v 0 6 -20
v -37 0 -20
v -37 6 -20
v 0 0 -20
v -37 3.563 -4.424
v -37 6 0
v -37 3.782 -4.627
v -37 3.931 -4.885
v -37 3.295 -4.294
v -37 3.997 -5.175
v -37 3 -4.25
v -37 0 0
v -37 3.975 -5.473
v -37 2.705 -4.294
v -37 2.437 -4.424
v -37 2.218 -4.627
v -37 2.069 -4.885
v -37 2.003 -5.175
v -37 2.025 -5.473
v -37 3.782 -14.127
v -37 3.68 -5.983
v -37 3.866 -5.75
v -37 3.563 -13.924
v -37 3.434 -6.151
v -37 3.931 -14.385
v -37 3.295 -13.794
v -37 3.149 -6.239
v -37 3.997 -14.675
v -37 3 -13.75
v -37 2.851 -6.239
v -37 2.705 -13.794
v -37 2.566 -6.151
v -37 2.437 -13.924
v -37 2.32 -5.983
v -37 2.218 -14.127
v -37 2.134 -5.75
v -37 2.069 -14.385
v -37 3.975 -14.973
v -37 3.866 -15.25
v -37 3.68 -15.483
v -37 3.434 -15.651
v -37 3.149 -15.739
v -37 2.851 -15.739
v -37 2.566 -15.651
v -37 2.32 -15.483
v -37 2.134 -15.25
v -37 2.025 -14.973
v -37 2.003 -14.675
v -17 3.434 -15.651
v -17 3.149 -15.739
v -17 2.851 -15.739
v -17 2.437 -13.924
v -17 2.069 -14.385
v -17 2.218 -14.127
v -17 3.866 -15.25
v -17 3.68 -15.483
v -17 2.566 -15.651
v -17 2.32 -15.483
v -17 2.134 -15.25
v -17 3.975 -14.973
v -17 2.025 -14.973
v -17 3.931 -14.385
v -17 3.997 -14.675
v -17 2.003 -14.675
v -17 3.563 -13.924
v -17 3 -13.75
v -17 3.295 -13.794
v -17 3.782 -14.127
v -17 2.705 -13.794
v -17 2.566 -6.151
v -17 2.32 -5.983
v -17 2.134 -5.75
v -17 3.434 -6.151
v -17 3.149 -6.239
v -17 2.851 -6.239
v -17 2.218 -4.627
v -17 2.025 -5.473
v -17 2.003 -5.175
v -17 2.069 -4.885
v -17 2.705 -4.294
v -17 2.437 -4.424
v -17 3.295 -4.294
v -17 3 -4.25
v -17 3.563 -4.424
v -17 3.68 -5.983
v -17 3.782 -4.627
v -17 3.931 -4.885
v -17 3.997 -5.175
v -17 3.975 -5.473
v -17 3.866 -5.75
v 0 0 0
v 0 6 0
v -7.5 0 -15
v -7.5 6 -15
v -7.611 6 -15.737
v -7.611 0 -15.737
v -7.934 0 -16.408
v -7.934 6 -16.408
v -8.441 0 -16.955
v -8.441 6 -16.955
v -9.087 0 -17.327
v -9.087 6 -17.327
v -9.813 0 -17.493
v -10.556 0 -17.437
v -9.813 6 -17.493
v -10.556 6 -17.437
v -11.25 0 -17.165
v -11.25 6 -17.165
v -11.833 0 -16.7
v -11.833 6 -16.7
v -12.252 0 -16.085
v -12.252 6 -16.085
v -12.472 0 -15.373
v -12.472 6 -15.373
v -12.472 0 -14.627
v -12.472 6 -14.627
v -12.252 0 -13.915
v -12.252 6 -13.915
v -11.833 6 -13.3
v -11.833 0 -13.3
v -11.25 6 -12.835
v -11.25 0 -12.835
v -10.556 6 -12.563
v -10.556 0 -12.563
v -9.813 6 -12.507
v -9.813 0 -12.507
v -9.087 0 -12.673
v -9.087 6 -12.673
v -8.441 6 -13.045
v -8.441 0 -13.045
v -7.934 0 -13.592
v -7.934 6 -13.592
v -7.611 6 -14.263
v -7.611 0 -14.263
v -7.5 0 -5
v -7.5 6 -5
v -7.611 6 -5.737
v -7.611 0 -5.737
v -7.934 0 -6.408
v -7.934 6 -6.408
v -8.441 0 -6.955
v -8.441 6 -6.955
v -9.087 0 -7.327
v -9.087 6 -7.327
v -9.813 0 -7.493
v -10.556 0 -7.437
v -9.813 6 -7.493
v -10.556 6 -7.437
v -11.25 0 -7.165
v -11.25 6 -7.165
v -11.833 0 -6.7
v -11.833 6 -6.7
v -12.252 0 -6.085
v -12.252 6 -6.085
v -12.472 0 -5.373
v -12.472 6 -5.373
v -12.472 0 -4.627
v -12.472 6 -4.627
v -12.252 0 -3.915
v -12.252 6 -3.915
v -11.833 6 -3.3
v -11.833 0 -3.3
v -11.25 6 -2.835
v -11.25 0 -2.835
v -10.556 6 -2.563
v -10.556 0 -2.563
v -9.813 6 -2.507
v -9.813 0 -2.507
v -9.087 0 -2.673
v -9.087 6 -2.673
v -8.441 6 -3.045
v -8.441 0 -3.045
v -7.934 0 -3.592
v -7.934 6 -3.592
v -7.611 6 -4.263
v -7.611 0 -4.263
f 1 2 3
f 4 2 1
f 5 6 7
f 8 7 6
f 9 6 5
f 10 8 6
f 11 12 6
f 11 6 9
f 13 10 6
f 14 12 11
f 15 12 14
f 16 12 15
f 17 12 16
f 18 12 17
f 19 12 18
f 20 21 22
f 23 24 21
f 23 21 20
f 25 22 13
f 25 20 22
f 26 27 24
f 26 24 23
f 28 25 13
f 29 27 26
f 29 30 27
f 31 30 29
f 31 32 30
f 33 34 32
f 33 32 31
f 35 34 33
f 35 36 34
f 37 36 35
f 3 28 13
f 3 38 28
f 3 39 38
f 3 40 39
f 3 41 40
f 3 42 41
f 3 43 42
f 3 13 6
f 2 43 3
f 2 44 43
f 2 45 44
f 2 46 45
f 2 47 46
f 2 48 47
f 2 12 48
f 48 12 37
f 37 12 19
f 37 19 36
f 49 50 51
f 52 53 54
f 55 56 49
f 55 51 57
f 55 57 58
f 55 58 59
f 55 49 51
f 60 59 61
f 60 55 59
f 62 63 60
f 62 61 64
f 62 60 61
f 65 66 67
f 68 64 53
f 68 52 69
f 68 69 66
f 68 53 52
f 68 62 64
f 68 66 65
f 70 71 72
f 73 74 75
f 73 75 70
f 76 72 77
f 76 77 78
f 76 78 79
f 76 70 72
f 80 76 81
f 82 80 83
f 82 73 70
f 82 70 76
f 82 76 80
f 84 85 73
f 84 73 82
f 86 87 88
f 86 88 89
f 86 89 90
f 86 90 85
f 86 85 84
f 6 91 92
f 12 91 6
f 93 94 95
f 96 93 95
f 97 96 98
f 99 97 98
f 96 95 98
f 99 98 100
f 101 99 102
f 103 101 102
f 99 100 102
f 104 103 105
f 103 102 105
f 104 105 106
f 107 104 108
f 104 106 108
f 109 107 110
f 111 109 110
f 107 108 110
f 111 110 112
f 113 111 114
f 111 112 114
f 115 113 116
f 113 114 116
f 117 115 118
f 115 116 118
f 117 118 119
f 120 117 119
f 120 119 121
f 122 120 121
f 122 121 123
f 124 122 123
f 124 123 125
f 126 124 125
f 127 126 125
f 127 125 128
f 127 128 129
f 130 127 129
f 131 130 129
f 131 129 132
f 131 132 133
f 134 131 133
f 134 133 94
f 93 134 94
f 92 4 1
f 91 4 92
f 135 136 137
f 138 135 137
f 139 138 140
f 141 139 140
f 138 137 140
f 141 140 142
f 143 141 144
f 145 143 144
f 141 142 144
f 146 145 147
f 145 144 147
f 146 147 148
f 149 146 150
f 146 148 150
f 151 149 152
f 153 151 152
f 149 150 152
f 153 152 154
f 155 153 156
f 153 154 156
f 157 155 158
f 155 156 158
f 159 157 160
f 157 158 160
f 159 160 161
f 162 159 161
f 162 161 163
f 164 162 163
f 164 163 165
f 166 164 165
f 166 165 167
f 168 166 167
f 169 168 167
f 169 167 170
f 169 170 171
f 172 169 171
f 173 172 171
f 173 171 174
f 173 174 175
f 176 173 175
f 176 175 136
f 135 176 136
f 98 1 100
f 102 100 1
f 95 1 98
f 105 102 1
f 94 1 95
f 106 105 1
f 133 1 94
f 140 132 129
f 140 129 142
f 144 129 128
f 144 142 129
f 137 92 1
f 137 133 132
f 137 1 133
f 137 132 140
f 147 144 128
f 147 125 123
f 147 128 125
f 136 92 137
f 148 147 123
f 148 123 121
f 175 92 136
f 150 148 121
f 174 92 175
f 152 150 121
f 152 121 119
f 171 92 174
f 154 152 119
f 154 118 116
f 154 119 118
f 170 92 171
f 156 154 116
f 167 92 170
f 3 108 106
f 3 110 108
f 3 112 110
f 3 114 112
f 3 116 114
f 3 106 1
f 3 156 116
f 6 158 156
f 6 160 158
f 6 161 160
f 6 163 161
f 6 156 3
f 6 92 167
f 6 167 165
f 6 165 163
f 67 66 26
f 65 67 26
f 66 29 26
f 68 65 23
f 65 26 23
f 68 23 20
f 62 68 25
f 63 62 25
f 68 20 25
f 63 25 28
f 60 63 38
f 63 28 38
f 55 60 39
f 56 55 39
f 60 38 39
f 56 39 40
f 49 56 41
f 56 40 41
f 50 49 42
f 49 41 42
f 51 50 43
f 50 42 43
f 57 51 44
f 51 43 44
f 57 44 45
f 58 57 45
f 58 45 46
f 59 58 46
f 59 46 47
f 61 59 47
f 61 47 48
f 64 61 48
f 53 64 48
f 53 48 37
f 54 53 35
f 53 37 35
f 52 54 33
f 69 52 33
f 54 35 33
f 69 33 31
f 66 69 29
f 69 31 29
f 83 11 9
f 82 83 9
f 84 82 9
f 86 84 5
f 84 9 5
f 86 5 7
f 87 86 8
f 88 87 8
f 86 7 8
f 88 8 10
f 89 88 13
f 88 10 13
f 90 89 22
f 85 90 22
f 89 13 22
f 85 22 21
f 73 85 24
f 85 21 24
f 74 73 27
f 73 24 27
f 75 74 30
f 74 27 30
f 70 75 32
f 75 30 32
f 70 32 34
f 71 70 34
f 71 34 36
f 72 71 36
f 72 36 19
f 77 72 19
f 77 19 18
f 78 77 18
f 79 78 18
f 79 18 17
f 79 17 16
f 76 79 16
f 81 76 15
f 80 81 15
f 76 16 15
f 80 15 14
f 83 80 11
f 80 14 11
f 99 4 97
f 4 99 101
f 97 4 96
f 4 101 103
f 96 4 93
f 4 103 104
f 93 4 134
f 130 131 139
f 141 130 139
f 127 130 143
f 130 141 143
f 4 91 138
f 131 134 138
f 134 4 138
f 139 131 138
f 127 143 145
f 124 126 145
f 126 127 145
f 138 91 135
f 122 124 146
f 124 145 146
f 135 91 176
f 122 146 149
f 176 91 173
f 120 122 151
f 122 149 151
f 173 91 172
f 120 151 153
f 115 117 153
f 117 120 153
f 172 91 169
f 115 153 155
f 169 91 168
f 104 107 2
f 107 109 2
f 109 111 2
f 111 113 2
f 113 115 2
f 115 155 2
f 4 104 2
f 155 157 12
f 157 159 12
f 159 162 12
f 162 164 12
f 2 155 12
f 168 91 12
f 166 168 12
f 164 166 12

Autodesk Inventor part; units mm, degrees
ref_plane "YZ Plane" through (0, 0, 0) normal (1, 0, 0) x (0, 1, 0)
ref_plane "XZ Plane" through (0, 0, 0) normal (0, 1, 0) x (-1, 0, 0)
ref_plane "XY Plane" through (0, 0, 0) normal (0, 0, 1) x (1, 0, 0)
sketch "Sketch1" plane through (0, 0, 0) normal (0, 1, 0) x (-1, 0, 0)
  line L0 (0, 0) -> (37, 0)
  line L1 (37, 0) -> (37, -20)
  line L2 (37, -20) -> (0, -20)
  line L3 (0, -20) -> (0, 0)
  dimension "d0" = 37
  dimension "d1" = 20
extrude "Extrusion1" add sketch "Sketch1" along normal blind 6
sketch "Sketch2" plane through (0, 6, 0) normal (0, 1, 0) x (1, 0, 0)
  circle A0 centre (-10, 5) radius 2.5
  circle A1 centre (-10, 15) radius 2.5
  line L0 (0, 0) -> (0, 20) projected
  line L1 (0, 20) -> (-37, 20) projected
  line L2 (-37, 0) -> (0, 0) projected
  dimension "d4" = 5
  dimension "d5" = 5
  dimension "d6" = 10
  dimension "d7" = 10
  dimension "d8" = 5
  dimension "d9" = 5
extrude "Extrusion2" cut sketch "Sketch2" against normal blind 8
sketch "Sketch3" plane through (-37, 0, -20) normal (-1, 0, 0) x (0, 0, 1)
  circle A0 centre (5.25, 3) radius 1
  circle A1 centre (14.75, 3) radius 1
  line L0 (0, 0) -> (20, 0) projected
  line L1 (0, 0) -> (0, 6) projected
  dimension "d12" = 2
  dimension "d13" = 2
  dimension "d14" = 9.5
  dimension "d15" = 3
  dimension "d16" = 3
  dimension "d17" = 5.25
extrude "Extrusion3" cut sketch "Sketch3" against normal blind 20
thread "Thread1" size "M2x0.4" class "6H" standard "ANSI Metric M Profile" full length
thread "Thread2" size "M2x0.4" class "6H" standard "ANSI Metric M Profile" full length
properties part number "Endstop_holer_X"
